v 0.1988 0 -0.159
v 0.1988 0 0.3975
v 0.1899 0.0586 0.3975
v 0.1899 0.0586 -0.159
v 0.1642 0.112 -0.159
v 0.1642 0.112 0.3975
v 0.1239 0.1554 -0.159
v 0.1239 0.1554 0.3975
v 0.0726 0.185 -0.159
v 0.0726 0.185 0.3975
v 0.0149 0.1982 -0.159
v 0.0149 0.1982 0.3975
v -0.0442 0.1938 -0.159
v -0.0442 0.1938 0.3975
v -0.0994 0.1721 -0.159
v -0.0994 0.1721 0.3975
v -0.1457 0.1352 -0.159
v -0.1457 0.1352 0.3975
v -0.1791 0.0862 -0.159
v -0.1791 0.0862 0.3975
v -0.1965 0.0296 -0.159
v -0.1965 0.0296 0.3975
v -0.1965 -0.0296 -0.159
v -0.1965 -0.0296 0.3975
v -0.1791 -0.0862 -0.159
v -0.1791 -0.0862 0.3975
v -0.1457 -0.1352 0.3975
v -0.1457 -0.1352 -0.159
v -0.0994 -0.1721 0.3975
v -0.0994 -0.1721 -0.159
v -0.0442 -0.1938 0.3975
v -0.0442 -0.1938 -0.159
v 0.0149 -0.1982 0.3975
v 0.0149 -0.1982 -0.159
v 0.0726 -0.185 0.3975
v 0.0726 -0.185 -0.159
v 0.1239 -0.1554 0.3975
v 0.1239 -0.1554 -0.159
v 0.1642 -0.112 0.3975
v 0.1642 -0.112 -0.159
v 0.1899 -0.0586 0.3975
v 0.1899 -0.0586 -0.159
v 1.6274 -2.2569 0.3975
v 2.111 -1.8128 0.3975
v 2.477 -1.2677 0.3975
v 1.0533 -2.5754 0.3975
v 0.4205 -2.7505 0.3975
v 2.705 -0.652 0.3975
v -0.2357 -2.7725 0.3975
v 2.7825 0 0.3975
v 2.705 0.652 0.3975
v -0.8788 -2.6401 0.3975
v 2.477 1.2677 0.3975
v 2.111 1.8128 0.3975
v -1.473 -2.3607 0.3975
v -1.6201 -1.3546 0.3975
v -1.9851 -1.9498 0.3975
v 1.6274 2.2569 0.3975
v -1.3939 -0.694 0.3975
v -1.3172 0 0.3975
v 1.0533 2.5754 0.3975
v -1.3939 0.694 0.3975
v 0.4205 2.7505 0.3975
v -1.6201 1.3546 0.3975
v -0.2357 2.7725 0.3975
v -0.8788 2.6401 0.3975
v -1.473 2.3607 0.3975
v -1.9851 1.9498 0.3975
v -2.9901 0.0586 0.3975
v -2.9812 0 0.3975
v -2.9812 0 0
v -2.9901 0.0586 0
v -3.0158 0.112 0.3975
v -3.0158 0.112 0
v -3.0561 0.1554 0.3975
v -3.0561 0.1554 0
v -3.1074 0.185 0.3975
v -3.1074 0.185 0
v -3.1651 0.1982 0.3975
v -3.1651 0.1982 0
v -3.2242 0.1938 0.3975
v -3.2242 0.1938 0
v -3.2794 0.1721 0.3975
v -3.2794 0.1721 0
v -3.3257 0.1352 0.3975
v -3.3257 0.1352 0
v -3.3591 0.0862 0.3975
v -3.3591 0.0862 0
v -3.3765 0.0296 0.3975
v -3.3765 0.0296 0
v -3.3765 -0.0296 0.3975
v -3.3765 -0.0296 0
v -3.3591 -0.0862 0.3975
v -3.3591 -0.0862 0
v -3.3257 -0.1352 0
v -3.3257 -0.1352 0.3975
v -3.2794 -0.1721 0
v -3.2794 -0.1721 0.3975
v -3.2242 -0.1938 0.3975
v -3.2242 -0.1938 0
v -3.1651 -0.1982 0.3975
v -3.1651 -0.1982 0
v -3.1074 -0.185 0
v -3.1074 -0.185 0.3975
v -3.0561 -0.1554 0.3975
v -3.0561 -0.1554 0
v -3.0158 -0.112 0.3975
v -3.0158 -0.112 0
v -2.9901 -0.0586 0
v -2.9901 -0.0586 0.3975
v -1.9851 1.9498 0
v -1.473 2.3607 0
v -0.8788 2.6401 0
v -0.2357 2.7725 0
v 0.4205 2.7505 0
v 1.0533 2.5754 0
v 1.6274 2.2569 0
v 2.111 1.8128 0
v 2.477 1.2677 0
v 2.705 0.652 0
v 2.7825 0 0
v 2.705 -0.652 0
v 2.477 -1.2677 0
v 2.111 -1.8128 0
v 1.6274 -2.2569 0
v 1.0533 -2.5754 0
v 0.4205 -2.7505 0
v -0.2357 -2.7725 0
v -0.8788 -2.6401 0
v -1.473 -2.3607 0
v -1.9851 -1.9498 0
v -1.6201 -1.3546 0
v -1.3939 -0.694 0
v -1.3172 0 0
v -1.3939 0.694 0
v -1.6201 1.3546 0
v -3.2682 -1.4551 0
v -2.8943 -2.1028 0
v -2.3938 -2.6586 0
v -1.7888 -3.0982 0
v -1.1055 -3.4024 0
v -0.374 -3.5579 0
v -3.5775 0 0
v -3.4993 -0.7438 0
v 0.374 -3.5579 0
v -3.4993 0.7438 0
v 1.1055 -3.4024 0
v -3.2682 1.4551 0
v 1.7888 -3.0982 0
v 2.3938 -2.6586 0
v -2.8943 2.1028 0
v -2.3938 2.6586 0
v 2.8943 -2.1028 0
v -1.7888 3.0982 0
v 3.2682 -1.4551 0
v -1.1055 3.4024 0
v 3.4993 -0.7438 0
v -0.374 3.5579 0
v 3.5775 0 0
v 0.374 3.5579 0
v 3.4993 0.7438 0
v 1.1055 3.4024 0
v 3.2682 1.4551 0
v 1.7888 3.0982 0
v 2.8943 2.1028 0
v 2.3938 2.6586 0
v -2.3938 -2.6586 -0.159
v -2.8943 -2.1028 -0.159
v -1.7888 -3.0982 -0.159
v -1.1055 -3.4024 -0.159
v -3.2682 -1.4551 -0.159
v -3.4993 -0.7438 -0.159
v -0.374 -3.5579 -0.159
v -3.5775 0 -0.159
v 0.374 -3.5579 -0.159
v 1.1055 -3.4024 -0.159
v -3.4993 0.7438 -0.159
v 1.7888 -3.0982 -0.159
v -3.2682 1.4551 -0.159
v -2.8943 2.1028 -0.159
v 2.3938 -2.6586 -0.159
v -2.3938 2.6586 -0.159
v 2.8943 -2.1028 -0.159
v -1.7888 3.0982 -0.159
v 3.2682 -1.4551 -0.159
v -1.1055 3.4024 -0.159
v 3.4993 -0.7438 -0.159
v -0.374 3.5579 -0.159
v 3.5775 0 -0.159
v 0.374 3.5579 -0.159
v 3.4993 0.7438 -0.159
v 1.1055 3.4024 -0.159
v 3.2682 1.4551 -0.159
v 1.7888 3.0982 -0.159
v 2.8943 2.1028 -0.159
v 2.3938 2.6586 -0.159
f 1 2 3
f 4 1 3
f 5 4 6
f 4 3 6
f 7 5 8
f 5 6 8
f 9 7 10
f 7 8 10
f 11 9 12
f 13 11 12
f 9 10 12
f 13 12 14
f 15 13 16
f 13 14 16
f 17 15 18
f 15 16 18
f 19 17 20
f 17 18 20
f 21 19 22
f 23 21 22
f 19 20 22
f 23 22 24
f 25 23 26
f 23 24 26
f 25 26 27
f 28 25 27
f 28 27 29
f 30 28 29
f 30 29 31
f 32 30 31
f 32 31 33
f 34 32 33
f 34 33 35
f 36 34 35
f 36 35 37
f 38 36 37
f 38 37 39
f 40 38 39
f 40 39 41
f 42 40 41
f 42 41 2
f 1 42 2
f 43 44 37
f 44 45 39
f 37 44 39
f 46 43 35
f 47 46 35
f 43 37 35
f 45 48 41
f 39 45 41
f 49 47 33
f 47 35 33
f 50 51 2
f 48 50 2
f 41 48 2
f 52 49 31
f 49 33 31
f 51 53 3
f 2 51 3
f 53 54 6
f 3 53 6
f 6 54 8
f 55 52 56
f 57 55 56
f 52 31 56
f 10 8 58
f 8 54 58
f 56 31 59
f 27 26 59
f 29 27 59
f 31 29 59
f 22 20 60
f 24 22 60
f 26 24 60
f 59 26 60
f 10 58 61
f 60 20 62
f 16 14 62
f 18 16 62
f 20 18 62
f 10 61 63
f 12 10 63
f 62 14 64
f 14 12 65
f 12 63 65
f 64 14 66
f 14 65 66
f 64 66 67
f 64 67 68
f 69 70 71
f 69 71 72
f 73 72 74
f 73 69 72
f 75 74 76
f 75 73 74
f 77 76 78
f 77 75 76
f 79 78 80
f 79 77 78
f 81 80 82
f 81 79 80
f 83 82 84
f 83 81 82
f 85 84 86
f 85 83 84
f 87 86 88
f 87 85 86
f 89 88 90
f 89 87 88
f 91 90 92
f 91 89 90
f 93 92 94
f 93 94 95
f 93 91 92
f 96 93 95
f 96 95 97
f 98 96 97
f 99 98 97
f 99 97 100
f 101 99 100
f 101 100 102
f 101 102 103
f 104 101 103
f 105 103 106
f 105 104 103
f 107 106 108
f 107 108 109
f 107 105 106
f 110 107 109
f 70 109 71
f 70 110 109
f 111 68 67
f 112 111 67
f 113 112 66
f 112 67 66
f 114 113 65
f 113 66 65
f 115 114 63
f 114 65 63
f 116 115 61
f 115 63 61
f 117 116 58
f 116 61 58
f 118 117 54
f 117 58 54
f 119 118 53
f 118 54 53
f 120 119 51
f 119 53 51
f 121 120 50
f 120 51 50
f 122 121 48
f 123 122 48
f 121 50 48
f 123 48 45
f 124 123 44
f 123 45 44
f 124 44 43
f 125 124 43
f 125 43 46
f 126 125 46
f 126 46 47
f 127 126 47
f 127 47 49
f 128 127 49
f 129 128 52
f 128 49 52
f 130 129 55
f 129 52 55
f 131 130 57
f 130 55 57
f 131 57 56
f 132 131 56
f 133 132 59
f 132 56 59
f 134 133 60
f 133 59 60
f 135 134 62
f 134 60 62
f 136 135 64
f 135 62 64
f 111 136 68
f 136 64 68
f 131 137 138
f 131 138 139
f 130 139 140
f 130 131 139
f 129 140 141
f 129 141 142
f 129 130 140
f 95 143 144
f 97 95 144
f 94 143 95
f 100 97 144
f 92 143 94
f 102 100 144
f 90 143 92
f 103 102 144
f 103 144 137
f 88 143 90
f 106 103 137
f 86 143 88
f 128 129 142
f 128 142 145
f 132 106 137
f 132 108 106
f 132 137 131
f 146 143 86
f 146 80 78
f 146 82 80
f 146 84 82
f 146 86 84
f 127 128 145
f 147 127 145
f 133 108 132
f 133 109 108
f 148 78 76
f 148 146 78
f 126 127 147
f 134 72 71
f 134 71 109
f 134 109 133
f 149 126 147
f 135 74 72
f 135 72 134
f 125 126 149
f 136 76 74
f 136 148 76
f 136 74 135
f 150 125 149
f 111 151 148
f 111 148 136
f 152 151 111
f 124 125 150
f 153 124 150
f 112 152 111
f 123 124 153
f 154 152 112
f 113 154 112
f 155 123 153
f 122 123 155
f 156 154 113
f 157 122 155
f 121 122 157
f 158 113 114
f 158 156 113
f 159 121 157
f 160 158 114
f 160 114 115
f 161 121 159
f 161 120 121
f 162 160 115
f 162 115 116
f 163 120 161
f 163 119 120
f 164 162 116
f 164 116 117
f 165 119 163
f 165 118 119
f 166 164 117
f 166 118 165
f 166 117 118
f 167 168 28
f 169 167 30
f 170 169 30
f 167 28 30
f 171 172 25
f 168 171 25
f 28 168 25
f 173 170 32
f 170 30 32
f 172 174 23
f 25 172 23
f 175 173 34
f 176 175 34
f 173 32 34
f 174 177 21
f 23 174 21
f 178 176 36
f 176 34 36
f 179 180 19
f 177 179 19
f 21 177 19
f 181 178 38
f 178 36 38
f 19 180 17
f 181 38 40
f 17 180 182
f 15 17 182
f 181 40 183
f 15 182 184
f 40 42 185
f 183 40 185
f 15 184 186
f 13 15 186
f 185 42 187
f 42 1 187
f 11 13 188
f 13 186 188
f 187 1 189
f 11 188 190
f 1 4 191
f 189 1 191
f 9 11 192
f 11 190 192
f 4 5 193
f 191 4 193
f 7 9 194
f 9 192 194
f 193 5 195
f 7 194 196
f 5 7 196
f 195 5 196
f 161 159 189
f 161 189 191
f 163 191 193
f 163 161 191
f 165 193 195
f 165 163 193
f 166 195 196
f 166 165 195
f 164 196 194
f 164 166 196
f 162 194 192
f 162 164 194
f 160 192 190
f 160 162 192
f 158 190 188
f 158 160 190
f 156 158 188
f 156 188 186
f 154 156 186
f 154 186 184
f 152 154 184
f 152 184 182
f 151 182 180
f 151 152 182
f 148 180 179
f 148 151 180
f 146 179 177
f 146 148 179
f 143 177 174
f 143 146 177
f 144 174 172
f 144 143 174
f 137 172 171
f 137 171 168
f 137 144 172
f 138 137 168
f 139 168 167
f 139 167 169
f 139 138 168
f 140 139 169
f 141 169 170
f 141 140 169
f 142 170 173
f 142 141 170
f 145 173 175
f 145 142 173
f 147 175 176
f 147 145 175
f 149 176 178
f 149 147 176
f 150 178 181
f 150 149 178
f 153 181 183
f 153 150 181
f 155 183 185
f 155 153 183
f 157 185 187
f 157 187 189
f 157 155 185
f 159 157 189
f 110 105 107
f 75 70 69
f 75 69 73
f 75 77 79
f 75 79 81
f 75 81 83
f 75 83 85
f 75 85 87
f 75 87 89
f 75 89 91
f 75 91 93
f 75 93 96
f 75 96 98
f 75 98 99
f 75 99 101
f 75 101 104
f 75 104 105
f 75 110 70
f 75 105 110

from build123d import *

# Parameters (mm, degrees)
SKETCH_1_R      = 3.5775
SKETCH_1_R_2    = 0.19875
EXTRUDE_2_DEPTH = 0.159
EXTRUDE_START   = 0.3975
SKETCH_1_6_R    = 0.19875
EXTRUDE_3_DEPTH = 0.3975


with BuildPart() as part:
    # 草图1 → 凸台-拉伸2 (new body)
    with BuildSketch(Plane.XY):
        Circle(SKETCH_1_R)
        Circle(SKETCH_1_R_2, mode=Mode.SUBTRACT)
    extrude(amount=-EXTRUDE_2_DEPTH)

    # 草图1<6> → 凸台-拉伸3 (add)
    # profile 1 of 2: a face of its own
    with BuildSketch(Plane.XY.offset(EXTRUDE_START)):
        with BuildLine():
            ThreePointArc((-1.985091803, 1.949799165), (-1.317199128, 0), (-1.985091803, -1.949799165))
            ThreePointArc((-1.985091803, -1.949799165), (2.7825, 0), (-1.985091803, 1.949799165))
        make_face()
        Circle(SKETCH_1_6_R, mode=Mode.SUBTRACT)
    # profile 2 of 2: a face of its own
    with BuildSketch(Plane.XY.offset(EXTRUDE_START)):
        with Locations((-3.18, 0)):
            Circle(SKETCH_1_6_R)
    extrude(amount=-EXTRUDE_3_DEPTH)


solid = part.part
